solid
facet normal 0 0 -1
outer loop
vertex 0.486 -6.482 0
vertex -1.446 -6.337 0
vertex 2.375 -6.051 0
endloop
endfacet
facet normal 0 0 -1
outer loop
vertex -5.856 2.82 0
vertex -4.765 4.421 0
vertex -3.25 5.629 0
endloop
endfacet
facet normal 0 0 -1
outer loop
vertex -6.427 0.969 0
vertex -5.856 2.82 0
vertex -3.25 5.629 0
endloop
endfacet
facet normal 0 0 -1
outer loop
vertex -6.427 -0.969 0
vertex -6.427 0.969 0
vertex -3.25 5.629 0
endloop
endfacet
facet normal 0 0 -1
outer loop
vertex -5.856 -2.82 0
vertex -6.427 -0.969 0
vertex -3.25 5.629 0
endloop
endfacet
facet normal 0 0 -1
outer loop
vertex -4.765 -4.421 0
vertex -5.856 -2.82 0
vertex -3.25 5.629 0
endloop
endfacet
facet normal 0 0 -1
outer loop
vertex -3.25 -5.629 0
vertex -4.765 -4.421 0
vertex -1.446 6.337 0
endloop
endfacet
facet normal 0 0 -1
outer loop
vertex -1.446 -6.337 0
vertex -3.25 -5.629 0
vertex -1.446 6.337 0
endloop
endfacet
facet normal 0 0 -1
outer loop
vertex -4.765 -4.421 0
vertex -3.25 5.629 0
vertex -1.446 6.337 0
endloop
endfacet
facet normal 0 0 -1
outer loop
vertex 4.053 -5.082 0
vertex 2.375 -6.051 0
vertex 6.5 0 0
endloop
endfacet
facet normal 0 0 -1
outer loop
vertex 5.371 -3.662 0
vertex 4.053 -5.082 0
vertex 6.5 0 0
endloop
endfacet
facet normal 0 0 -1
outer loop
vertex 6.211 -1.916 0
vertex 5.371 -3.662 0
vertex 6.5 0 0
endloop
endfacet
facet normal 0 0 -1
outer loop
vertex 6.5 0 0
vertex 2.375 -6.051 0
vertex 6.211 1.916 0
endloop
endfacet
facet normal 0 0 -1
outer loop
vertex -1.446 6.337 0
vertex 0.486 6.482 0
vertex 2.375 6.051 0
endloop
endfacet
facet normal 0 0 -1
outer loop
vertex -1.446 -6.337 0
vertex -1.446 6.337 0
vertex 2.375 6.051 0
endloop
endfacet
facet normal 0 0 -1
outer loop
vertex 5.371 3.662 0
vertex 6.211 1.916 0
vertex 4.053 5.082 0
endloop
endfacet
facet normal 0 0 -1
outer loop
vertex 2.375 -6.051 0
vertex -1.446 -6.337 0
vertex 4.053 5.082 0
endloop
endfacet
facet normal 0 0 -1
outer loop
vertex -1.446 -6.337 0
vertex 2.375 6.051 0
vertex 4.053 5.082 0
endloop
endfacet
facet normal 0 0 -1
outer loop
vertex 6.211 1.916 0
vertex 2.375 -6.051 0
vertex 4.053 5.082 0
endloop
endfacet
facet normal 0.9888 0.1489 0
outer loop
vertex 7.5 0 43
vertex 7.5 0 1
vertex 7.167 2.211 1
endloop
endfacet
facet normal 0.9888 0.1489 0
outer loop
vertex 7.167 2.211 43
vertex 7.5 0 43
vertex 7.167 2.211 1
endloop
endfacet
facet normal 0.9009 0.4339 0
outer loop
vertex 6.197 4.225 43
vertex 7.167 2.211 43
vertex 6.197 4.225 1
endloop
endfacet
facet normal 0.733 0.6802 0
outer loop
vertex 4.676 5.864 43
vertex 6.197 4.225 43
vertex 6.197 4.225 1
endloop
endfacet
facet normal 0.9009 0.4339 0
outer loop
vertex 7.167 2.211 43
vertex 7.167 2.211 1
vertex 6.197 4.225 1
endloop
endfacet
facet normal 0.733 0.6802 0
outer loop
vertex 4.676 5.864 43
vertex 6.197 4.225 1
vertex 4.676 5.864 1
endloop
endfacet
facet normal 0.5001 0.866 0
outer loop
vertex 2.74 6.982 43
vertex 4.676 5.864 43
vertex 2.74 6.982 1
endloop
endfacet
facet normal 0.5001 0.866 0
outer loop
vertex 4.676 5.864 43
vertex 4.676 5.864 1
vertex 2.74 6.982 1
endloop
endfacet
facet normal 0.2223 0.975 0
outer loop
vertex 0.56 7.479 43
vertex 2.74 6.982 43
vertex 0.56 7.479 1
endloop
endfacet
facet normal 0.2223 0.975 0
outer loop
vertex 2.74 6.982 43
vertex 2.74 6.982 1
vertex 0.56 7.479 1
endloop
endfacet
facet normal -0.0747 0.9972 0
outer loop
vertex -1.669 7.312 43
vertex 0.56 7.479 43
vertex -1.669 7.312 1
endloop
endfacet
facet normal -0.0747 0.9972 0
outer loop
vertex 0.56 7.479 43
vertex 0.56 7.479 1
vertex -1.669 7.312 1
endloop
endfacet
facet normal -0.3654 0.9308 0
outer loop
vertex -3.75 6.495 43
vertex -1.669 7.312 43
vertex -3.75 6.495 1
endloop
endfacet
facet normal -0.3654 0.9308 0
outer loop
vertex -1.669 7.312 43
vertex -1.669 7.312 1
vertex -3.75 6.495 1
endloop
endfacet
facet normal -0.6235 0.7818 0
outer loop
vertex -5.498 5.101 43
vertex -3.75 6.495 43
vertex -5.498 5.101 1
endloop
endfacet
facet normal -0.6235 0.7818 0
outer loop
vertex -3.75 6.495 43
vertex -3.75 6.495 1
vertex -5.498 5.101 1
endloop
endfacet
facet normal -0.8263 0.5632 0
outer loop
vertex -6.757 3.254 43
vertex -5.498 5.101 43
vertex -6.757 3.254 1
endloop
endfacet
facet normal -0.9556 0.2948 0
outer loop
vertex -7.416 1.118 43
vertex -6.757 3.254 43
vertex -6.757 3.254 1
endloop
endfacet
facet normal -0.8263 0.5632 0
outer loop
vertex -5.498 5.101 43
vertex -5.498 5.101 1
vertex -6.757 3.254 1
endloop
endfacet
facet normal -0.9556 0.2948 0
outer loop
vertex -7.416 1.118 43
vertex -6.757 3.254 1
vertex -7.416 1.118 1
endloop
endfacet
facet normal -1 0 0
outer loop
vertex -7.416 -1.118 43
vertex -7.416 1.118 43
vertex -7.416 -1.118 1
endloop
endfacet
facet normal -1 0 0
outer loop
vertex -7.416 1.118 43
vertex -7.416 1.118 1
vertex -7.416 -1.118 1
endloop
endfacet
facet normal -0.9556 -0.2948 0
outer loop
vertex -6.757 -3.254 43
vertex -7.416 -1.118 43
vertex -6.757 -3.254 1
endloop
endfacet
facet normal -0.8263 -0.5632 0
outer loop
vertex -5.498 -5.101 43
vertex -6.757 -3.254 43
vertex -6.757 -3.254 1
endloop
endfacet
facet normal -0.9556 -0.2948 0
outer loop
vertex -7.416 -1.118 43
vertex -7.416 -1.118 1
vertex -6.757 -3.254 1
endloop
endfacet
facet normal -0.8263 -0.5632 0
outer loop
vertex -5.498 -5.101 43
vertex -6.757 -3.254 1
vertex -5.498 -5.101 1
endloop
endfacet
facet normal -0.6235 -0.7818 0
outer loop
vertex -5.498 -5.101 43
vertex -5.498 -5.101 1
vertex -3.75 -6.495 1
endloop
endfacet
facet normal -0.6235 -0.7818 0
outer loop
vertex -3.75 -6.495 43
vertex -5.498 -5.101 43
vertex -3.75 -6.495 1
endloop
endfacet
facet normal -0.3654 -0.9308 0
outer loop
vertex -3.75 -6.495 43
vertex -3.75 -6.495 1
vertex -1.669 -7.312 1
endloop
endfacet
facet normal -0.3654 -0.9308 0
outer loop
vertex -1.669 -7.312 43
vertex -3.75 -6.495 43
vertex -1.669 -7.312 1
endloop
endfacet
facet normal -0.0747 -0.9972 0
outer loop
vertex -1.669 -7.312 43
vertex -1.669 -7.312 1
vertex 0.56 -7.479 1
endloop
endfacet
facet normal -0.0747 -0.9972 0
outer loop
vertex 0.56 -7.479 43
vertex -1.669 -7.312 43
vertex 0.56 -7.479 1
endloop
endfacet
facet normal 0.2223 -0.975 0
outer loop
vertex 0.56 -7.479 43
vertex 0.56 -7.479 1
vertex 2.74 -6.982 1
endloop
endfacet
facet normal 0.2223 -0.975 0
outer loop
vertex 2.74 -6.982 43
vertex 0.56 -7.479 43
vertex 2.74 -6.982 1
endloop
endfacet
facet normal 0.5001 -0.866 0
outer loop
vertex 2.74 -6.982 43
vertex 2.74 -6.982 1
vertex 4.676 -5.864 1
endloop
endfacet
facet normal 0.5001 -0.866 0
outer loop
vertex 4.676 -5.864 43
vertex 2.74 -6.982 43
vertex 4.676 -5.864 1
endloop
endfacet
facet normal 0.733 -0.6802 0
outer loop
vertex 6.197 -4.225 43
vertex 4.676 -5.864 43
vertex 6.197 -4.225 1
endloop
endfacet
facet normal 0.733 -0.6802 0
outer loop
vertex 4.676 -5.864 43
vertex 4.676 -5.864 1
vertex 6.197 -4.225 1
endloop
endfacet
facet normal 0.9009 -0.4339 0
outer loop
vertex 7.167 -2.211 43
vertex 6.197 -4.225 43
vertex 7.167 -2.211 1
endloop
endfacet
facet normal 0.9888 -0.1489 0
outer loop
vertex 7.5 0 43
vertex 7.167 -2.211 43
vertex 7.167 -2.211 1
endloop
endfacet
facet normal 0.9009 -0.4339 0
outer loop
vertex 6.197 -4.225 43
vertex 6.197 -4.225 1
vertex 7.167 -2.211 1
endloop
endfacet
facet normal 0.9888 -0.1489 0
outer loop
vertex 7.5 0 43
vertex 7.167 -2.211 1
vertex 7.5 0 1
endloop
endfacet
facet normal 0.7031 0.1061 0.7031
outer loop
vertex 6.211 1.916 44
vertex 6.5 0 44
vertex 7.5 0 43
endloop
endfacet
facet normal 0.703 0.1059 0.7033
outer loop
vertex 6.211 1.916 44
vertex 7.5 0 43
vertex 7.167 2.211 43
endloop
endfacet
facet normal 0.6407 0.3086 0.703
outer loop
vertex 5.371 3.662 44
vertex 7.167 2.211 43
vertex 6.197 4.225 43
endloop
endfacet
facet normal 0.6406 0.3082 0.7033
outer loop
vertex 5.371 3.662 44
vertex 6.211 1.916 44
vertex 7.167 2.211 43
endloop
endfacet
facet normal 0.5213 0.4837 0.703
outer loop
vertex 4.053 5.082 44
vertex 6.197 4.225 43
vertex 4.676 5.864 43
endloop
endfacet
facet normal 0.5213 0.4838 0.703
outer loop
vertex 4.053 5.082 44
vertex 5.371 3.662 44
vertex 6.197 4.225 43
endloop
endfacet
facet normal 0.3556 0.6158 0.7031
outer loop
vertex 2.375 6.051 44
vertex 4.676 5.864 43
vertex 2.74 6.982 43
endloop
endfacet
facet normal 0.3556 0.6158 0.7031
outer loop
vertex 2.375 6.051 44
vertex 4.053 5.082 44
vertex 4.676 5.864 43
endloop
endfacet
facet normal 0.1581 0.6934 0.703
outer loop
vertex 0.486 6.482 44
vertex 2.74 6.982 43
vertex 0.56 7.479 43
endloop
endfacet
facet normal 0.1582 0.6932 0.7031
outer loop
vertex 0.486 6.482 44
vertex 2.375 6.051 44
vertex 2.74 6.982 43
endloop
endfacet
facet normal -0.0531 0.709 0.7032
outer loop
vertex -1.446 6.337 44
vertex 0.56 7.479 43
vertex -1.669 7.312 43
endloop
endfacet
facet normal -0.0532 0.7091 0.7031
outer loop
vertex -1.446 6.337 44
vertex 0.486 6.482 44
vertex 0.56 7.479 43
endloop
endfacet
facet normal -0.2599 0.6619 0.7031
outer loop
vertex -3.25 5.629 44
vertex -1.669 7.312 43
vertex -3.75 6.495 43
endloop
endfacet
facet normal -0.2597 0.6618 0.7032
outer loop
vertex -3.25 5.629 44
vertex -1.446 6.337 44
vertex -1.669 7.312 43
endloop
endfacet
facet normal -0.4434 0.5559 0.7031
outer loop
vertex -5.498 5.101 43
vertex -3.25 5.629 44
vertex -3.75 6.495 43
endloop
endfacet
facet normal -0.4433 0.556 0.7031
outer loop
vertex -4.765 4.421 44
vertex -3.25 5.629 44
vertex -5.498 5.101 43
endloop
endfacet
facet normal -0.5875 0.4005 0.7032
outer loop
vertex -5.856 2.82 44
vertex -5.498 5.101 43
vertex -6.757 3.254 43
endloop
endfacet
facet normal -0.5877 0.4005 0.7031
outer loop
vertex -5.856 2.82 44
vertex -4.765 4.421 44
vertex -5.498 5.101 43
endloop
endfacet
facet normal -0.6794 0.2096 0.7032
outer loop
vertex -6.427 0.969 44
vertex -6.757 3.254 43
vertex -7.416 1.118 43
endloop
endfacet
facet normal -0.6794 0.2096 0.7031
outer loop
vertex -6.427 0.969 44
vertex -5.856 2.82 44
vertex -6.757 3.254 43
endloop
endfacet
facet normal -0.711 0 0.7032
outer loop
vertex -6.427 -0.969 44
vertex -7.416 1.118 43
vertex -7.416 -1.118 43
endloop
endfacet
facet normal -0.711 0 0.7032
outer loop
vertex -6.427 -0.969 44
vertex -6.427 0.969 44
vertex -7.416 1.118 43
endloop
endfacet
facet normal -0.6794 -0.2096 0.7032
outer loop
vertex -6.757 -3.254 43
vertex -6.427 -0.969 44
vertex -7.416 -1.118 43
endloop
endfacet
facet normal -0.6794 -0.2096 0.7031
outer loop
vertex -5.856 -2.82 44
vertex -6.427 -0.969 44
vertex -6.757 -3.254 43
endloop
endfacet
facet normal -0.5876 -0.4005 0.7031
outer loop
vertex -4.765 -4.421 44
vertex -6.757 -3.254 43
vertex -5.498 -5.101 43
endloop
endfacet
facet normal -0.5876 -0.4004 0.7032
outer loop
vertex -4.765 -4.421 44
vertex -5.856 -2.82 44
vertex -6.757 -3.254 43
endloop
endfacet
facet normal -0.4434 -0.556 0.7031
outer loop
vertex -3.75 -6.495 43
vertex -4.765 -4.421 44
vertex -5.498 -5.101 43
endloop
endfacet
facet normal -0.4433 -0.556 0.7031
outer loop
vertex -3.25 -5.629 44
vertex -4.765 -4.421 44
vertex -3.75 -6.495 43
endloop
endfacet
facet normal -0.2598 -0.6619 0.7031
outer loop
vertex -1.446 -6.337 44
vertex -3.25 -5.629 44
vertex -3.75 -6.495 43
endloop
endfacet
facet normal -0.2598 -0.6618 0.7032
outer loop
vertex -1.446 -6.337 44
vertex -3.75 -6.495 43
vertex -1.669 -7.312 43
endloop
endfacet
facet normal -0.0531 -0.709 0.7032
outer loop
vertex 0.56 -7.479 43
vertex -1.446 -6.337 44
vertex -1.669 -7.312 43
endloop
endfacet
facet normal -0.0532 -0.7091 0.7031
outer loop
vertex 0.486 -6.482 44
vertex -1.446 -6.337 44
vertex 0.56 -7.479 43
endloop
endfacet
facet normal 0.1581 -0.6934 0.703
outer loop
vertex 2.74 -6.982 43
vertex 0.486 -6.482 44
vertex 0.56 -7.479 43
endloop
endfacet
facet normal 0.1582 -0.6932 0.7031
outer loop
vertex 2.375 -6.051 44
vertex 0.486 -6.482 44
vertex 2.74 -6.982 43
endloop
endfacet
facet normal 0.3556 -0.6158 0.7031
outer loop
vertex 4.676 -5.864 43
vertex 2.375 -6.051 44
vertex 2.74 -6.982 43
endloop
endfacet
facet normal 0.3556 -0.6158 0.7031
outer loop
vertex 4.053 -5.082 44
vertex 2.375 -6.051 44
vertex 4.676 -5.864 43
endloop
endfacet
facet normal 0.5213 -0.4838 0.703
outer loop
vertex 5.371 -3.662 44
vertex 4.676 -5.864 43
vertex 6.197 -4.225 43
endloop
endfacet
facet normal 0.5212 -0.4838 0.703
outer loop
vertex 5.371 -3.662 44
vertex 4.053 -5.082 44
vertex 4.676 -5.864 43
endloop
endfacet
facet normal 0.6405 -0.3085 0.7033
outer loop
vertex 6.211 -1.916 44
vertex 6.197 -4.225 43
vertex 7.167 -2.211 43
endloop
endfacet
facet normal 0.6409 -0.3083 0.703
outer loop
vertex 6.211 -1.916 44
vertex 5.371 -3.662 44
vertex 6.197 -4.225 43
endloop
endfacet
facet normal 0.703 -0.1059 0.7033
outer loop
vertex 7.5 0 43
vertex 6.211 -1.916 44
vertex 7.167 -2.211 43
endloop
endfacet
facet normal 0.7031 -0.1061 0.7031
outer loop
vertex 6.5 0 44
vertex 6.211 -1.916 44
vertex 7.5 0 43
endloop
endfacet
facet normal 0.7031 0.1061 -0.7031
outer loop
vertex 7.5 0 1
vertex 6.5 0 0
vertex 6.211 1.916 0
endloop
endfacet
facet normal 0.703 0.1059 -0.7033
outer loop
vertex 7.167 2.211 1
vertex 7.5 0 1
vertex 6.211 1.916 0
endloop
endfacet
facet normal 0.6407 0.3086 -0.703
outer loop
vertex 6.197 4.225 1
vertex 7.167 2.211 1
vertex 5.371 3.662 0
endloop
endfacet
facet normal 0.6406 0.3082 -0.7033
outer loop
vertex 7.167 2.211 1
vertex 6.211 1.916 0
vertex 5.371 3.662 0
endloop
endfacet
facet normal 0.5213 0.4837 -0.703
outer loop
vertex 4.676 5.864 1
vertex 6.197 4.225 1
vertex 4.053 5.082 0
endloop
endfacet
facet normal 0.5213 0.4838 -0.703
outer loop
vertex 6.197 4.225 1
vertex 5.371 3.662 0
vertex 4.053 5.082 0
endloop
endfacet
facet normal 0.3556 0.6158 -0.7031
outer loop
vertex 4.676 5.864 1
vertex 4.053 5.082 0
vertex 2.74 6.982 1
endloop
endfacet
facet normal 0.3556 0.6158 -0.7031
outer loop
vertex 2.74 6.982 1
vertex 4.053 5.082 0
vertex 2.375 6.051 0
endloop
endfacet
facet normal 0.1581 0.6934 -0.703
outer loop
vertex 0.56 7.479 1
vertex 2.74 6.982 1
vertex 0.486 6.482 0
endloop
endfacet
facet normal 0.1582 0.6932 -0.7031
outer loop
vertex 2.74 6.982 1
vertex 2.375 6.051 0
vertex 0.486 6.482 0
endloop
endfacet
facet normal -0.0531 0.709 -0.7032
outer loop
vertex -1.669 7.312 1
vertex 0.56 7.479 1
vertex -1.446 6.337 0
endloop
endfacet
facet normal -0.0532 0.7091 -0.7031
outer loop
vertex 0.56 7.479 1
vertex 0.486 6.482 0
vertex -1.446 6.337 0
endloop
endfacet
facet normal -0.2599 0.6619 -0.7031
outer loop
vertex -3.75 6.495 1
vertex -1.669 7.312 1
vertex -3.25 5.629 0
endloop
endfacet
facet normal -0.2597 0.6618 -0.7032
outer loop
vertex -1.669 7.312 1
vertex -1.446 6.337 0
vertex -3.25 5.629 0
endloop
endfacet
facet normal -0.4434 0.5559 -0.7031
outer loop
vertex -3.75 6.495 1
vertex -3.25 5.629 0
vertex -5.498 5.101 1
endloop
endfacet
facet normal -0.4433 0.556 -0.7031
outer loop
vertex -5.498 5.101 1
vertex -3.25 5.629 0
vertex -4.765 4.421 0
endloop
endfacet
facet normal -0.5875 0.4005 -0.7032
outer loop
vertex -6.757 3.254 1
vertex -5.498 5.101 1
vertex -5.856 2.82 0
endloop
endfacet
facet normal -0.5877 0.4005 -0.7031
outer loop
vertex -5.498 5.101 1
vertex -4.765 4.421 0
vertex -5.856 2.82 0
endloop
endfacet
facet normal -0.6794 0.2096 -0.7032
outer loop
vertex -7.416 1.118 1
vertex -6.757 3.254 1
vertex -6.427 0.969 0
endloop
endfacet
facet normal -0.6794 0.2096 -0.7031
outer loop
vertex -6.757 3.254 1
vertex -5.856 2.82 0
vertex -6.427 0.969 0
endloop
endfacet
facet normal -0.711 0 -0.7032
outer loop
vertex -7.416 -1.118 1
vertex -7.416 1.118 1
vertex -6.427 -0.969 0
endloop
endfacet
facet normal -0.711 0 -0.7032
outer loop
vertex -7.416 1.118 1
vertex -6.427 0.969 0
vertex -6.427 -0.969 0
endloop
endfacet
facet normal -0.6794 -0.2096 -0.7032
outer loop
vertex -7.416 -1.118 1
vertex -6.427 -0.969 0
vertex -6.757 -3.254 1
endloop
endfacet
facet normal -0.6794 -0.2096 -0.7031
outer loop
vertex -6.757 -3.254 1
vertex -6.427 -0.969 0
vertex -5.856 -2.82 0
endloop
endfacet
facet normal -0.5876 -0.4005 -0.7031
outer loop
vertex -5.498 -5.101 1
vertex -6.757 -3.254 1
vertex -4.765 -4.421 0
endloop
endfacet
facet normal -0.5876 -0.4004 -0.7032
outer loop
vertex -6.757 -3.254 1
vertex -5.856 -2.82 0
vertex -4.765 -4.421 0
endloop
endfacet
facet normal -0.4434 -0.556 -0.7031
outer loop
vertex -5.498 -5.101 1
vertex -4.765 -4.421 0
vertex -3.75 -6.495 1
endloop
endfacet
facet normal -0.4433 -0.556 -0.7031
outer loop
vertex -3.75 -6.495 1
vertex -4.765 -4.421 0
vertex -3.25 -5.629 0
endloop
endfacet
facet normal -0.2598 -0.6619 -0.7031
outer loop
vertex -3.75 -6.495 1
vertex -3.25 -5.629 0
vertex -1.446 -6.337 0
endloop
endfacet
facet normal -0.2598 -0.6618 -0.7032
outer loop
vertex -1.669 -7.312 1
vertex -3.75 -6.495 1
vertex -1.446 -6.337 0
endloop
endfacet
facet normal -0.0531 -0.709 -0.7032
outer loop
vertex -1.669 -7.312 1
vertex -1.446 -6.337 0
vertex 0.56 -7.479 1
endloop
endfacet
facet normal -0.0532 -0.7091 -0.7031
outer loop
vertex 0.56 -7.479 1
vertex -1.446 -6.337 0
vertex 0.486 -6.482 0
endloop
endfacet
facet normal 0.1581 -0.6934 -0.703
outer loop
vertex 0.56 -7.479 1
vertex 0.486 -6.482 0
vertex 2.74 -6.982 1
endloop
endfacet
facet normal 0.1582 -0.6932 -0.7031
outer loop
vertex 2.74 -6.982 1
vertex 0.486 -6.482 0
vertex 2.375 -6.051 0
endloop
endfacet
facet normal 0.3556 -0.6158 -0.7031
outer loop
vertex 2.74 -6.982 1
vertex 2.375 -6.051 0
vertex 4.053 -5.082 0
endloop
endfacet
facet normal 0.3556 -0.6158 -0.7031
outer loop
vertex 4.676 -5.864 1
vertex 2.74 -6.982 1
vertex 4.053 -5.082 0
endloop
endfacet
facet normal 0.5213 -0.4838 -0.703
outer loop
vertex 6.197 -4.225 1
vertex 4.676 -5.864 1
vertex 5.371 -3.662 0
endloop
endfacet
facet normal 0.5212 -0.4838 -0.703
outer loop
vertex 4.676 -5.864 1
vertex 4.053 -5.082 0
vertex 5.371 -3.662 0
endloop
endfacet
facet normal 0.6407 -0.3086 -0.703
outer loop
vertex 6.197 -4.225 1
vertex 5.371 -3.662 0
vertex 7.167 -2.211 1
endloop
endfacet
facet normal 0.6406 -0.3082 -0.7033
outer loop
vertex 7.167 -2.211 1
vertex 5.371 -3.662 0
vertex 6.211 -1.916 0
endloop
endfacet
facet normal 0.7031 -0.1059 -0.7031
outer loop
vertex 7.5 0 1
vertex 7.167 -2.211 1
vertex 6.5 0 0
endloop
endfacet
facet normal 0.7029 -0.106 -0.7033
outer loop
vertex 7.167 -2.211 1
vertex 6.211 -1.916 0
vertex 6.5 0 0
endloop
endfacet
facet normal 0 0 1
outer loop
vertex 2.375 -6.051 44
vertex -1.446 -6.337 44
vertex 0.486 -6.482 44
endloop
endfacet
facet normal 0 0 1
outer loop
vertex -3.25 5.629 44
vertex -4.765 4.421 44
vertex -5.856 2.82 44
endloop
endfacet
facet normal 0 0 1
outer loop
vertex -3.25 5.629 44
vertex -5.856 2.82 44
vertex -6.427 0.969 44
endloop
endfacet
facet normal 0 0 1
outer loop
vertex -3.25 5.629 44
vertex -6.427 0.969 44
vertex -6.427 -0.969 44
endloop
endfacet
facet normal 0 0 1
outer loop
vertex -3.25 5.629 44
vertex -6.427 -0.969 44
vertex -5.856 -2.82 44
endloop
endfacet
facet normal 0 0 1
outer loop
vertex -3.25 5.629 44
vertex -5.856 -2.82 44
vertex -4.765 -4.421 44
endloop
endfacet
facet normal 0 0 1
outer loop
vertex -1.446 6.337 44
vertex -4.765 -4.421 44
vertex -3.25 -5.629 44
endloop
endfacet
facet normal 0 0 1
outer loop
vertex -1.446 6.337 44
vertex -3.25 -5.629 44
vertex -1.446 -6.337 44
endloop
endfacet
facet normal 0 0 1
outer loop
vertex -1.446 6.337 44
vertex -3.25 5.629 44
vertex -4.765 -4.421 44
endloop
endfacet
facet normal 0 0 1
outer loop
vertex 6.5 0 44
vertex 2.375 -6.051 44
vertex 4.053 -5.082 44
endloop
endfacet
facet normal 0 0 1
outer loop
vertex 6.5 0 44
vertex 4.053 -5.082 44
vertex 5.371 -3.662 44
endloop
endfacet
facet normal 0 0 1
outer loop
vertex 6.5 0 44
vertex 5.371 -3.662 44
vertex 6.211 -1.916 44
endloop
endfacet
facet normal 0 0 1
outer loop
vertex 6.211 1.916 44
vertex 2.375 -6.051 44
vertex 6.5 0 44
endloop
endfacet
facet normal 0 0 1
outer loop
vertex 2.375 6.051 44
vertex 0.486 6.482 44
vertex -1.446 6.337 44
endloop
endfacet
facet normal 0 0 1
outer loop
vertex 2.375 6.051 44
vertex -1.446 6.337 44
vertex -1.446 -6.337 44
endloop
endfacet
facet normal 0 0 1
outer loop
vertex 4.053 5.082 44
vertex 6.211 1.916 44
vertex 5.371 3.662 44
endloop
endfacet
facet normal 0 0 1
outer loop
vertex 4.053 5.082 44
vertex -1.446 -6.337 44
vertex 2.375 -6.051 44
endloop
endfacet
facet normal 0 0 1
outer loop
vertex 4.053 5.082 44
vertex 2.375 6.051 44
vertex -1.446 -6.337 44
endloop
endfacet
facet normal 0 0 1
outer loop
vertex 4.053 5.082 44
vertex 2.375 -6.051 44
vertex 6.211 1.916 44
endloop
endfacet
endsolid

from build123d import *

# Parameters (mm, degrees)
SKETCH1_R           = 7.5
BOSS_EXTRUDE1_DEPTH = 44
CHAMFER1_SIZE       = 1
CHAMFER2_SIZE       = 1


with BuildPart() as part:
    # Sketch1 → Boss-Extrude1 (new body)
    with BuildSketch(Plane.XY):
        Circle(SKETCH1_R)
    extrude(amount=BOSS_EXTRUDE1_DEPTH)

    # Chamfer1
    chamfer1_edges = [part.edges().sort_by_distance(p)[0] for p in [
        (-7.5, 0, 0),
    ]]
    chamfer(chamfer1_edges, length=CHAMFER1_SIZE)

    # Chamfer2
    chamfer2_edges = [part.edges().sort_by_distance(p)[0] for p in [
        (-7.5, 0, 44),
    ]]
    chamfer(chamfer2_edges, length=CHAMFER2_SIZE)


solid = part.part
